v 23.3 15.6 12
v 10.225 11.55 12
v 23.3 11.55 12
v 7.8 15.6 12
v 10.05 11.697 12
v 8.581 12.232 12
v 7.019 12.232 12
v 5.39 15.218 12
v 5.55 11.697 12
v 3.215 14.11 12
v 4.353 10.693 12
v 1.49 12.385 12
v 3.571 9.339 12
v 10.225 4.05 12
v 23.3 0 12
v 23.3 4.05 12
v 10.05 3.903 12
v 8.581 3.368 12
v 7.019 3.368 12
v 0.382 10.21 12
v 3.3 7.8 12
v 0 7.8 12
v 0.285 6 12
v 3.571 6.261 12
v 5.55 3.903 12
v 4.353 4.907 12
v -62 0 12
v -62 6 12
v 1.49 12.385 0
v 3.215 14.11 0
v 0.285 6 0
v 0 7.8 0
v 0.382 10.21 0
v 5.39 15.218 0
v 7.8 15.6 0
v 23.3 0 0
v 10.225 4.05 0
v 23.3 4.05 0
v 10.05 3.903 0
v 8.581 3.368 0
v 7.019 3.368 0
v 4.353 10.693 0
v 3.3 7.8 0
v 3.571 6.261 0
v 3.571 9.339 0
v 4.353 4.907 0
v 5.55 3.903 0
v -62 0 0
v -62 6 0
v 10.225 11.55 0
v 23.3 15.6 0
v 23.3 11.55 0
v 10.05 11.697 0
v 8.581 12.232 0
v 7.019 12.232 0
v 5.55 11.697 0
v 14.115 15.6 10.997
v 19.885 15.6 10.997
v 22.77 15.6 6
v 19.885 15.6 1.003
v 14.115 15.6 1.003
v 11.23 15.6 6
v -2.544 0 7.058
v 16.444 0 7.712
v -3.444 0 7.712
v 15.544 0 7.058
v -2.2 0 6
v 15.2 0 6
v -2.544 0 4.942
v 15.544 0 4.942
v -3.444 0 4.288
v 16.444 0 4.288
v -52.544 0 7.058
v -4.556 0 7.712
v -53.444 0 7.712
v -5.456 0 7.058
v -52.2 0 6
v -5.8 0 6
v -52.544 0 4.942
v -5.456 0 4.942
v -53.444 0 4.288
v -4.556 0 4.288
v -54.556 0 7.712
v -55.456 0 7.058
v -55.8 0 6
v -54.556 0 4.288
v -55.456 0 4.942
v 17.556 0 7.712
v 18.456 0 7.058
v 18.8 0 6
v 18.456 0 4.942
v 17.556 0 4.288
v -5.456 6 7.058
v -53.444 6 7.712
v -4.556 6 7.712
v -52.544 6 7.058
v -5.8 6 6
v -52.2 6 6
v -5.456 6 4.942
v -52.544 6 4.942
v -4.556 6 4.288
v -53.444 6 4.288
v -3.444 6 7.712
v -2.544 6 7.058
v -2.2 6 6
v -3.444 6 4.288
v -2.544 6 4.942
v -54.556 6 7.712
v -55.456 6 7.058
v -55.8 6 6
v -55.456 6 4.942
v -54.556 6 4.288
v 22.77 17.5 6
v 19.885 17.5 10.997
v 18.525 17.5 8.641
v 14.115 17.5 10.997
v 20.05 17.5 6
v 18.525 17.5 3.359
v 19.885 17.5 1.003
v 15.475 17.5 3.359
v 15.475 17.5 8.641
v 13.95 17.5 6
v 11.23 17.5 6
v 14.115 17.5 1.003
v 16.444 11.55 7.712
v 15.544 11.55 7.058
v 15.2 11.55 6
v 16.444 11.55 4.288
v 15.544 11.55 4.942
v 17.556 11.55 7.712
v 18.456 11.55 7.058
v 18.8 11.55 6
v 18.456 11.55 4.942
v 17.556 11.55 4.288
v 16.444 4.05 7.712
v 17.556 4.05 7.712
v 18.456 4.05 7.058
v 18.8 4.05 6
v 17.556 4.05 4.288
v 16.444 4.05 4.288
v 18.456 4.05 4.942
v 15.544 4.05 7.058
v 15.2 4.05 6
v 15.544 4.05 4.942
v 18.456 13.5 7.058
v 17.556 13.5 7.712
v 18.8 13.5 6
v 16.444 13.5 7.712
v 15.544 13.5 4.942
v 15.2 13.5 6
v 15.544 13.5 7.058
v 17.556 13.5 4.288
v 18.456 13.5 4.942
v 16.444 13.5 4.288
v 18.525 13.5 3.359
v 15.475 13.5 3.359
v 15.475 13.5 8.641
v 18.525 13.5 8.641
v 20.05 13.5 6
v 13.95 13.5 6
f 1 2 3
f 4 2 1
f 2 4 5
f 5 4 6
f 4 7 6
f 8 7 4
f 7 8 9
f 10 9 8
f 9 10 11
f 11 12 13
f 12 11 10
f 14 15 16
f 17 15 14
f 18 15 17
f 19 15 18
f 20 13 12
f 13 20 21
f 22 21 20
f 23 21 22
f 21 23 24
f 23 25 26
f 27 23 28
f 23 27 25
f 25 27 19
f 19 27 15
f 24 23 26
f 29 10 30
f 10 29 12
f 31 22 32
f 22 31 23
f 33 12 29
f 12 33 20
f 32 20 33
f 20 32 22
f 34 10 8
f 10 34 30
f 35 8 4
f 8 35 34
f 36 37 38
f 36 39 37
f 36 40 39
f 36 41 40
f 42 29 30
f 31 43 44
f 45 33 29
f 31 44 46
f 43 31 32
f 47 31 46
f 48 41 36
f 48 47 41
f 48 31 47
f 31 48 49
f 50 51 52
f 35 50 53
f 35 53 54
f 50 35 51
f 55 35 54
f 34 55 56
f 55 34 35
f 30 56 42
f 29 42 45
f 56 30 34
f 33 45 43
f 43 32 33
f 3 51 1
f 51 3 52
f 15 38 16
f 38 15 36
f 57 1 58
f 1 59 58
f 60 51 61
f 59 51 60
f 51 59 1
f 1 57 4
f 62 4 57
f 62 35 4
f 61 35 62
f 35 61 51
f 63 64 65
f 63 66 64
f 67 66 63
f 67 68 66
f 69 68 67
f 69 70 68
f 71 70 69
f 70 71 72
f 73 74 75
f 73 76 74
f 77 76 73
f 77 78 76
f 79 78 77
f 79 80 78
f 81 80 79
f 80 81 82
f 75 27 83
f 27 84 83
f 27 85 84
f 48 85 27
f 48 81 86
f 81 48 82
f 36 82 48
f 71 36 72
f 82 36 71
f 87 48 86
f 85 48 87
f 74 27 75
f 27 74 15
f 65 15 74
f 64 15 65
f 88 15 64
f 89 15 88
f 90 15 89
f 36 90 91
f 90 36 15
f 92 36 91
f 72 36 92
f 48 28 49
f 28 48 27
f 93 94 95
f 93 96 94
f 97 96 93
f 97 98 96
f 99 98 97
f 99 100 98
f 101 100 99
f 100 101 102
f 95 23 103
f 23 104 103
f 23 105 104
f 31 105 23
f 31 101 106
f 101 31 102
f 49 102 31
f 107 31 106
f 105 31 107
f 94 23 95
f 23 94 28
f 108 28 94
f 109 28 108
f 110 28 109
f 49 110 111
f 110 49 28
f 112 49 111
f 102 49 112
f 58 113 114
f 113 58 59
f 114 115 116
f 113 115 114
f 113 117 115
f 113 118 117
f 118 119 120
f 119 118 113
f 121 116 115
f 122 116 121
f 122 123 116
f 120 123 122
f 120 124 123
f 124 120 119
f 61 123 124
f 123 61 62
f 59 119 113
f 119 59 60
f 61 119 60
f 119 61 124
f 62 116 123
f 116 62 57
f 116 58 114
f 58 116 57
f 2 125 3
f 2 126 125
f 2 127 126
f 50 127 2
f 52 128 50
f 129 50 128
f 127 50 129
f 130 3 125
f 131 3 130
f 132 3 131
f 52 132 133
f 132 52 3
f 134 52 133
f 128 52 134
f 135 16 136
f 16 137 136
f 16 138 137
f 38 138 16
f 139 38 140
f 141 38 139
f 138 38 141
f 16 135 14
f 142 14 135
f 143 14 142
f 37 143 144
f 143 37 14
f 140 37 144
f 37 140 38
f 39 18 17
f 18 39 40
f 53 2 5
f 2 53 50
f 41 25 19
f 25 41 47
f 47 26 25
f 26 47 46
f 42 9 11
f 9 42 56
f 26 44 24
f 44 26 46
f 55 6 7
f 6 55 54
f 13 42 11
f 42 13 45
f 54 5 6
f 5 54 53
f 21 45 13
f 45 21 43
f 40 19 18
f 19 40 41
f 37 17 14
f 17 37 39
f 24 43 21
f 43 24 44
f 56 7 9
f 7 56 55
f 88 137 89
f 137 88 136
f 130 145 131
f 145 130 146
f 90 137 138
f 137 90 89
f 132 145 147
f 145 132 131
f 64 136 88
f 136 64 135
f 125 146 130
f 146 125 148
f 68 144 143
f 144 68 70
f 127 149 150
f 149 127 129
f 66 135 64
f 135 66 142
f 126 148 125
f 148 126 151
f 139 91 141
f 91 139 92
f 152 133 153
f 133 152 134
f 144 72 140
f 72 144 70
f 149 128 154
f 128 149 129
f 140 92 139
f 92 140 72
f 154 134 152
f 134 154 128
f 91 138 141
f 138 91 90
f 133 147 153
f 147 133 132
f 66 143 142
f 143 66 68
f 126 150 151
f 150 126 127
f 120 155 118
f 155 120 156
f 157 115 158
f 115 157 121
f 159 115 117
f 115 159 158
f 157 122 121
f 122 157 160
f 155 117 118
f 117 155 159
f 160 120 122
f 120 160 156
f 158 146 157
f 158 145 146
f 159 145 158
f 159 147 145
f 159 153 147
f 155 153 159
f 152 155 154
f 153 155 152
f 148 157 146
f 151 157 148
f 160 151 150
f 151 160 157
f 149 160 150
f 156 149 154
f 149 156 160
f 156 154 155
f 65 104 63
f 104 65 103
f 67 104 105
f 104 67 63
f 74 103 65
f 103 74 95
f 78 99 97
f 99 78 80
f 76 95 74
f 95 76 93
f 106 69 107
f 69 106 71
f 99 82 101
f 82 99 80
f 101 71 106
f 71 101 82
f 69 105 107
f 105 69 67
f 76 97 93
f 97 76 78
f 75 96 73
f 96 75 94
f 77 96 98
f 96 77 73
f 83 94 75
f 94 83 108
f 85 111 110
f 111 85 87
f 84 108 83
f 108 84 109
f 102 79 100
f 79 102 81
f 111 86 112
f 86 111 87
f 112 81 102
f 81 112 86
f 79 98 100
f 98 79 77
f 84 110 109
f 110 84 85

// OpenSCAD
// PRUSA Mendel
// RAMPS-holder (modified endstop holder)
// Used to attach RAMPS to 8mm rods
// GNU GPL v3
// Endstop holder by:
// Josef Prusa
// josefprusa@me.com
// prusadjs.cz
// RAMPS-holder by:
// Michiel Haisma
// michielhaisma@hotmail.com
// http://blog.stygia.nl
//
// http://github.com/prusajr/PrusaMendel

m8_diameter = 9; 
m8_nut_diameter = 14.1;

m4_diameter = 4.5;
m4_nut_diameter = 9;

m3_diameter = 3.6;
m3_nut_diameter = 5.3;
m3_nut_diameter_horizontal = 6.1;

/**
 * @id endstop-holder
 * @name Endstop holder
 * @category Printed
 * @using 1 m3x20xhex
 * @using 1 m3nut
 * @using 2 m3washer
 */
module endstop(){
outer_diameter = m8_diameter/2+3.3;
screw_hole_spacing = 50;
opening_size = m8_diameter-1.5; //openingsize

difference(){
	union(){
		translate([outer_diameter, outer_diameter, 0]) cylinder(h =12, r = outer_diameter, $fn = 20);
		translate([outer_diameter, 0, 0]) cube([15.5,outer_diameter*2,12]);
		translate([-62, 0, 0]) cube([70, 6, 12]);
		translate([17, 17.5, 6]) rotate([90, 0, 0]) #cylinder(h = 5, r = 5.77, $fn = 6);
	}

	translate([9, outer_diameter-opening_size/2, 0]) cube([18,opening_size,20]);
	translate([outer_diameter, outer_diameter, 0]) cylinder(h =20, r = m8_diameter/2, $fn = 18);

	//Securing hole
	translate([17, 17, 6]) rotate([90, 0, 0]) cylinder(h =20, r = m3_diameter/2, $fn = 10);
	translate([17, 19.5, 6]) rotate([90, 0, 0]) #cylinder(h =6, r = m3_nut_diameter_horizontal/2, $fn = 6);

	translate([17, 17, 6]) rotate([90, 0, 0]) #cylinder(h =20, r = m3_diameter/2, $fn = 10);
	translate([-4, 17, 6]) rotate([90, 0, 0]) cylinder(h =20, r = m3_diameter/2, $fn = 10);
	translate([-(4+screw_hole_spacing), 17, 6]) rotate([90, 0, 0]) cylinder(h =20, r = m3_diameter/2, $fn = 10);
}
}
endstop();
